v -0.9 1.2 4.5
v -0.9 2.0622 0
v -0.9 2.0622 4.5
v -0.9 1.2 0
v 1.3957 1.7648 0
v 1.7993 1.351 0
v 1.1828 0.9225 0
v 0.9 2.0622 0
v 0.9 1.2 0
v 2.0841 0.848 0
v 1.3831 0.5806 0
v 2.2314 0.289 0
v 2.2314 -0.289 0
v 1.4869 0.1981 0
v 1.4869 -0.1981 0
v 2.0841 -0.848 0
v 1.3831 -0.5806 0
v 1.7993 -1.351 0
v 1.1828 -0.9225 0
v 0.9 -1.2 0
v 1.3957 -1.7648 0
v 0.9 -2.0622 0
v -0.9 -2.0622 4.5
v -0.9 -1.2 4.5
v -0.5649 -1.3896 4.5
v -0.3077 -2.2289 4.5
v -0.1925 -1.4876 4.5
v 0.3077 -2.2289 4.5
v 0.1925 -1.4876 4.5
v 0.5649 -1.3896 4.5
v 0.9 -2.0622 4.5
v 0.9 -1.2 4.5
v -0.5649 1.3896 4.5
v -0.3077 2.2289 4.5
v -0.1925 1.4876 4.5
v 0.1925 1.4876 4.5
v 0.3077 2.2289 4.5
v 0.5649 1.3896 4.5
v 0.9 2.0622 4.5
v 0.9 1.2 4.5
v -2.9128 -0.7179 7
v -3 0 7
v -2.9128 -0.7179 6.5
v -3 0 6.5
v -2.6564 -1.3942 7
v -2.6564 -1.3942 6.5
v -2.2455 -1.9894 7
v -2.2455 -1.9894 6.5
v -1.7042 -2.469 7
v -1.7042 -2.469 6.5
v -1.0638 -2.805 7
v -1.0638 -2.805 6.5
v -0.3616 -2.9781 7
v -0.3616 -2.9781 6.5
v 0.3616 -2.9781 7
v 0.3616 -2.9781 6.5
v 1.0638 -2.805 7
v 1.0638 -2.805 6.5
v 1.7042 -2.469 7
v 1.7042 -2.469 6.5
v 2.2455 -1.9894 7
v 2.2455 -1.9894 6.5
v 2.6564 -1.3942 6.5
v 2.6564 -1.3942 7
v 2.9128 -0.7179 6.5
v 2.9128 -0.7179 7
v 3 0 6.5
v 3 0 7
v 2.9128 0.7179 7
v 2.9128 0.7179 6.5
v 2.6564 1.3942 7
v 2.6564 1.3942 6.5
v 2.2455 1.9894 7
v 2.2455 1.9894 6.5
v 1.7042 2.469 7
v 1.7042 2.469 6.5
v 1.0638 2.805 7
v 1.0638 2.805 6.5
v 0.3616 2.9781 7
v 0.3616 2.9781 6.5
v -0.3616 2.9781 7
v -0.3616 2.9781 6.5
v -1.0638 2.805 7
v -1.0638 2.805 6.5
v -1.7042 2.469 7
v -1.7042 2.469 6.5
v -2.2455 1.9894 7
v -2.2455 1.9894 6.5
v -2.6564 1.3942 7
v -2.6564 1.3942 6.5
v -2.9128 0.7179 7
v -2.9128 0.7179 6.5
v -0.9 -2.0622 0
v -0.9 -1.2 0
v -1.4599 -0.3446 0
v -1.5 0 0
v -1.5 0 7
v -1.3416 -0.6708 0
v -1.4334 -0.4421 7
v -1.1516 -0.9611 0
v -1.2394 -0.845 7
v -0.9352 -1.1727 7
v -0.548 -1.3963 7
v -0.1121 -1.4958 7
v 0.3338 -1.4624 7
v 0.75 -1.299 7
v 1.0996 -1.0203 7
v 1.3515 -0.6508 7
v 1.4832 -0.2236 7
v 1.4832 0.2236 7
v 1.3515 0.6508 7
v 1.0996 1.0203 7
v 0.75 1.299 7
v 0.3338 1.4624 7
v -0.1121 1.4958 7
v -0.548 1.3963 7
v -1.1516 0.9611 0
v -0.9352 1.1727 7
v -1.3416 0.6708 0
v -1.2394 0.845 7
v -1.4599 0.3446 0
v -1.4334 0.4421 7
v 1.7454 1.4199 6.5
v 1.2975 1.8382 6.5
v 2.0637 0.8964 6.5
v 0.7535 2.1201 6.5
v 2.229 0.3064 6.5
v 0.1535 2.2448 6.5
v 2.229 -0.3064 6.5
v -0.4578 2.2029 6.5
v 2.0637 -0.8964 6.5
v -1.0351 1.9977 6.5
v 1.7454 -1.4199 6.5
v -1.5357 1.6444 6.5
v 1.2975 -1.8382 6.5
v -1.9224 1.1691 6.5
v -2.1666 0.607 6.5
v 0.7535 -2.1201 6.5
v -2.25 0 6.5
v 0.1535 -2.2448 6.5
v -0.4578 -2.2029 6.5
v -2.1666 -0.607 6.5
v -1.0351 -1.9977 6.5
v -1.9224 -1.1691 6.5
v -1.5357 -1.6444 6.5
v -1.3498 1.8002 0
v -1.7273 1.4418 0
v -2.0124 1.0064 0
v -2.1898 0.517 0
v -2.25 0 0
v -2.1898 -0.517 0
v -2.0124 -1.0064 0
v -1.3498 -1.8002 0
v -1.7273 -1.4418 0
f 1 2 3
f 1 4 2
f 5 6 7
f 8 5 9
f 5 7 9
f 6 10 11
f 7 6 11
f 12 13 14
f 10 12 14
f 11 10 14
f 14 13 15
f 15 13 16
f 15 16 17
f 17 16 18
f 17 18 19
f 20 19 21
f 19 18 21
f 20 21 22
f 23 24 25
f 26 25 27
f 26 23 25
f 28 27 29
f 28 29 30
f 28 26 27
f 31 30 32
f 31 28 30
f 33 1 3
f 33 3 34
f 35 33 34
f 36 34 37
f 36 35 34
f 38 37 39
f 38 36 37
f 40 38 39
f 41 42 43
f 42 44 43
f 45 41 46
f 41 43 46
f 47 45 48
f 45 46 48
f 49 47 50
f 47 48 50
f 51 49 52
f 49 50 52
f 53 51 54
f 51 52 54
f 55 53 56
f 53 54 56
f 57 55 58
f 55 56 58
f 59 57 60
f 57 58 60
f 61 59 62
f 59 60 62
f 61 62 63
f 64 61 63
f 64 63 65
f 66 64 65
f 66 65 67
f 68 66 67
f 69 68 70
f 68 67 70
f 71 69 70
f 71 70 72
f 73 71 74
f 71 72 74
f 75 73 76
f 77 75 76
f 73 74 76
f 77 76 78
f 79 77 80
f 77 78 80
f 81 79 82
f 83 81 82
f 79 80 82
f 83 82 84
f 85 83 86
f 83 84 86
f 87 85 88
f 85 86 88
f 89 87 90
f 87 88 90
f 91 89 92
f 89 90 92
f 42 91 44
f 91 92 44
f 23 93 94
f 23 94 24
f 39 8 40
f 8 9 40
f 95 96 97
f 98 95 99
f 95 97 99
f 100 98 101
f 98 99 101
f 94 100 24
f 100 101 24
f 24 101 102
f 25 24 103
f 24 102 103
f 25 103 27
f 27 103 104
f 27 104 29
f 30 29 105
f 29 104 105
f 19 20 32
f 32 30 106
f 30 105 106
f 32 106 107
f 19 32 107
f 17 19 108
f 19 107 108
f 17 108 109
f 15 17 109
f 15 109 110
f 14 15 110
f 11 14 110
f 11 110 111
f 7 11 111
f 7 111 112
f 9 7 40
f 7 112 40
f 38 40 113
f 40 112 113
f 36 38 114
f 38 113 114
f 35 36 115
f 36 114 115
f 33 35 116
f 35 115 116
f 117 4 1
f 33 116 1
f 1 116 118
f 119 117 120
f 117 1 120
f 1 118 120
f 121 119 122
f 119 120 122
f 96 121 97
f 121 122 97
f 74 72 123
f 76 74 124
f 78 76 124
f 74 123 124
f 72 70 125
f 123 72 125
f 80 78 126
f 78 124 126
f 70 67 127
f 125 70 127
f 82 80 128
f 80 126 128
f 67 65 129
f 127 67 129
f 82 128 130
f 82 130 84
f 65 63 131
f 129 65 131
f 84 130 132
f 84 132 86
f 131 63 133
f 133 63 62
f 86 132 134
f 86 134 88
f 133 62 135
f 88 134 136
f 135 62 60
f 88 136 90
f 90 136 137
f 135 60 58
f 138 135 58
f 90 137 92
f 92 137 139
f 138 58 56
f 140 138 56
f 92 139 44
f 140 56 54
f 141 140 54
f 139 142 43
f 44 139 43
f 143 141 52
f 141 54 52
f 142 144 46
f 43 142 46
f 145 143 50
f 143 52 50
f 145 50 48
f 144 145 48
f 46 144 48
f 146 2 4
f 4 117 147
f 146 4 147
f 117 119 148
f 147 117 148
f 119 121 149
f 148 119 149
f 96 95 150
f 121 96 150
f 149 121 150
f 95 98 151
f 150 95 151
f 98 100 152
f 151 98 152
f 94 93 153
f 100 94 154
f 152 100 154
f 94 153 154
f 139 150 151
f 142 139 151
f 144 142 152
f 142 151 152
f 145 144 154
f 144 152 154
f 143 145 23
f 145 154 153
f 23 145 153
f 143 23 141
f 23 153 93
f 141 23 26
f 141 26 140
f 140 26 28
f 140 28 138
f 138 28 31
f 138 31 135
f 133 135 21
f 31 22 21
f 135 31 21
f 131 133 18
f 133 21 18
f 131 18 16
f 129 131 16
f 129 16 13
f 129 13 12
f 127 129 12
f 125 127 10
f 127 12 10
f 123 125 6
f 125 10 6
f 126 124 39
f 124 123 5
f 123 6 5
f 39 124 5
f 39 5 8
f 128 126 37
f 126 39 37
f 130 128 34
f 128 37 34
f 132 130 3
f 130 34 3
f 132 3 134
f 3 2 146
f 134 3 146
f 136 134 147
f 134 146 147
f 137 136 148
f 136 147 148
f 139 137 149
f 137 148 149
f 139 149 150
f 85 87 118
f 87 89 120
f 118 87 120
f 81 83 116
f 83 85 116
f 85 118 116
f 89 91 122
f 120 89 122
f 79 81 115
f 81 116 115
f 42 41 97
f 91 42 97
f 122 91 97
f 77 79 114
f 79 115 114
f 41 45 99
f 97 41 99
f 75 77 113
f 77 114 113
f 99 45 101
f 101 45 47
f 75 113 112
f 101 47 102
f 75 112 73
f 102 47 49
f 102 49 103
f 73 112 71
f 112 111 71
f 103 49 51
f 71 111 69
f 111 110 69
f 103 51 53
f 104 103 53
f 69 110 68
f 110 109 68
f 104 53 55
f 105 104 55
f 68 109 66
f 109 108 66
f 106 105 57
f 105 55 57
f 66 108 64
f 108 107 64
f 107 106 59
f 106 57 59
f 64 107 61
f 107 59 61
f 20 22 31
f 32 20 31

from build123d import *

# Parameters (mm, degrees)
F2_W     = 1.8
F2_H     = 5.0446866744
F3_DEPTH = 12.5


with BuildPart() as f1:
    # F0 (on Front) → F1 (revolve)
    with BuildSketch(Plane.XZ):
        Polygon((-2.25, 0), (-1.5, 0), (-1.5, 7), (-3, 7), (-3, 6.5), (-2.25, 6.5), align=None)
    revolve(axis=Axis((0, 0, 1.9970234007), (0, 0, 1)))

    # F2 (on Front) → F3 (cut, symmetric)
    with BuildSketch(Plane.XZ):
        with Locations((0, 1.9776566628)):
            Rectangle(F2_W, F2_H)
    extrude(amount=F3_DEPTH, both=True, mode=Mode.SUBTRACT)


solid = f1.part
